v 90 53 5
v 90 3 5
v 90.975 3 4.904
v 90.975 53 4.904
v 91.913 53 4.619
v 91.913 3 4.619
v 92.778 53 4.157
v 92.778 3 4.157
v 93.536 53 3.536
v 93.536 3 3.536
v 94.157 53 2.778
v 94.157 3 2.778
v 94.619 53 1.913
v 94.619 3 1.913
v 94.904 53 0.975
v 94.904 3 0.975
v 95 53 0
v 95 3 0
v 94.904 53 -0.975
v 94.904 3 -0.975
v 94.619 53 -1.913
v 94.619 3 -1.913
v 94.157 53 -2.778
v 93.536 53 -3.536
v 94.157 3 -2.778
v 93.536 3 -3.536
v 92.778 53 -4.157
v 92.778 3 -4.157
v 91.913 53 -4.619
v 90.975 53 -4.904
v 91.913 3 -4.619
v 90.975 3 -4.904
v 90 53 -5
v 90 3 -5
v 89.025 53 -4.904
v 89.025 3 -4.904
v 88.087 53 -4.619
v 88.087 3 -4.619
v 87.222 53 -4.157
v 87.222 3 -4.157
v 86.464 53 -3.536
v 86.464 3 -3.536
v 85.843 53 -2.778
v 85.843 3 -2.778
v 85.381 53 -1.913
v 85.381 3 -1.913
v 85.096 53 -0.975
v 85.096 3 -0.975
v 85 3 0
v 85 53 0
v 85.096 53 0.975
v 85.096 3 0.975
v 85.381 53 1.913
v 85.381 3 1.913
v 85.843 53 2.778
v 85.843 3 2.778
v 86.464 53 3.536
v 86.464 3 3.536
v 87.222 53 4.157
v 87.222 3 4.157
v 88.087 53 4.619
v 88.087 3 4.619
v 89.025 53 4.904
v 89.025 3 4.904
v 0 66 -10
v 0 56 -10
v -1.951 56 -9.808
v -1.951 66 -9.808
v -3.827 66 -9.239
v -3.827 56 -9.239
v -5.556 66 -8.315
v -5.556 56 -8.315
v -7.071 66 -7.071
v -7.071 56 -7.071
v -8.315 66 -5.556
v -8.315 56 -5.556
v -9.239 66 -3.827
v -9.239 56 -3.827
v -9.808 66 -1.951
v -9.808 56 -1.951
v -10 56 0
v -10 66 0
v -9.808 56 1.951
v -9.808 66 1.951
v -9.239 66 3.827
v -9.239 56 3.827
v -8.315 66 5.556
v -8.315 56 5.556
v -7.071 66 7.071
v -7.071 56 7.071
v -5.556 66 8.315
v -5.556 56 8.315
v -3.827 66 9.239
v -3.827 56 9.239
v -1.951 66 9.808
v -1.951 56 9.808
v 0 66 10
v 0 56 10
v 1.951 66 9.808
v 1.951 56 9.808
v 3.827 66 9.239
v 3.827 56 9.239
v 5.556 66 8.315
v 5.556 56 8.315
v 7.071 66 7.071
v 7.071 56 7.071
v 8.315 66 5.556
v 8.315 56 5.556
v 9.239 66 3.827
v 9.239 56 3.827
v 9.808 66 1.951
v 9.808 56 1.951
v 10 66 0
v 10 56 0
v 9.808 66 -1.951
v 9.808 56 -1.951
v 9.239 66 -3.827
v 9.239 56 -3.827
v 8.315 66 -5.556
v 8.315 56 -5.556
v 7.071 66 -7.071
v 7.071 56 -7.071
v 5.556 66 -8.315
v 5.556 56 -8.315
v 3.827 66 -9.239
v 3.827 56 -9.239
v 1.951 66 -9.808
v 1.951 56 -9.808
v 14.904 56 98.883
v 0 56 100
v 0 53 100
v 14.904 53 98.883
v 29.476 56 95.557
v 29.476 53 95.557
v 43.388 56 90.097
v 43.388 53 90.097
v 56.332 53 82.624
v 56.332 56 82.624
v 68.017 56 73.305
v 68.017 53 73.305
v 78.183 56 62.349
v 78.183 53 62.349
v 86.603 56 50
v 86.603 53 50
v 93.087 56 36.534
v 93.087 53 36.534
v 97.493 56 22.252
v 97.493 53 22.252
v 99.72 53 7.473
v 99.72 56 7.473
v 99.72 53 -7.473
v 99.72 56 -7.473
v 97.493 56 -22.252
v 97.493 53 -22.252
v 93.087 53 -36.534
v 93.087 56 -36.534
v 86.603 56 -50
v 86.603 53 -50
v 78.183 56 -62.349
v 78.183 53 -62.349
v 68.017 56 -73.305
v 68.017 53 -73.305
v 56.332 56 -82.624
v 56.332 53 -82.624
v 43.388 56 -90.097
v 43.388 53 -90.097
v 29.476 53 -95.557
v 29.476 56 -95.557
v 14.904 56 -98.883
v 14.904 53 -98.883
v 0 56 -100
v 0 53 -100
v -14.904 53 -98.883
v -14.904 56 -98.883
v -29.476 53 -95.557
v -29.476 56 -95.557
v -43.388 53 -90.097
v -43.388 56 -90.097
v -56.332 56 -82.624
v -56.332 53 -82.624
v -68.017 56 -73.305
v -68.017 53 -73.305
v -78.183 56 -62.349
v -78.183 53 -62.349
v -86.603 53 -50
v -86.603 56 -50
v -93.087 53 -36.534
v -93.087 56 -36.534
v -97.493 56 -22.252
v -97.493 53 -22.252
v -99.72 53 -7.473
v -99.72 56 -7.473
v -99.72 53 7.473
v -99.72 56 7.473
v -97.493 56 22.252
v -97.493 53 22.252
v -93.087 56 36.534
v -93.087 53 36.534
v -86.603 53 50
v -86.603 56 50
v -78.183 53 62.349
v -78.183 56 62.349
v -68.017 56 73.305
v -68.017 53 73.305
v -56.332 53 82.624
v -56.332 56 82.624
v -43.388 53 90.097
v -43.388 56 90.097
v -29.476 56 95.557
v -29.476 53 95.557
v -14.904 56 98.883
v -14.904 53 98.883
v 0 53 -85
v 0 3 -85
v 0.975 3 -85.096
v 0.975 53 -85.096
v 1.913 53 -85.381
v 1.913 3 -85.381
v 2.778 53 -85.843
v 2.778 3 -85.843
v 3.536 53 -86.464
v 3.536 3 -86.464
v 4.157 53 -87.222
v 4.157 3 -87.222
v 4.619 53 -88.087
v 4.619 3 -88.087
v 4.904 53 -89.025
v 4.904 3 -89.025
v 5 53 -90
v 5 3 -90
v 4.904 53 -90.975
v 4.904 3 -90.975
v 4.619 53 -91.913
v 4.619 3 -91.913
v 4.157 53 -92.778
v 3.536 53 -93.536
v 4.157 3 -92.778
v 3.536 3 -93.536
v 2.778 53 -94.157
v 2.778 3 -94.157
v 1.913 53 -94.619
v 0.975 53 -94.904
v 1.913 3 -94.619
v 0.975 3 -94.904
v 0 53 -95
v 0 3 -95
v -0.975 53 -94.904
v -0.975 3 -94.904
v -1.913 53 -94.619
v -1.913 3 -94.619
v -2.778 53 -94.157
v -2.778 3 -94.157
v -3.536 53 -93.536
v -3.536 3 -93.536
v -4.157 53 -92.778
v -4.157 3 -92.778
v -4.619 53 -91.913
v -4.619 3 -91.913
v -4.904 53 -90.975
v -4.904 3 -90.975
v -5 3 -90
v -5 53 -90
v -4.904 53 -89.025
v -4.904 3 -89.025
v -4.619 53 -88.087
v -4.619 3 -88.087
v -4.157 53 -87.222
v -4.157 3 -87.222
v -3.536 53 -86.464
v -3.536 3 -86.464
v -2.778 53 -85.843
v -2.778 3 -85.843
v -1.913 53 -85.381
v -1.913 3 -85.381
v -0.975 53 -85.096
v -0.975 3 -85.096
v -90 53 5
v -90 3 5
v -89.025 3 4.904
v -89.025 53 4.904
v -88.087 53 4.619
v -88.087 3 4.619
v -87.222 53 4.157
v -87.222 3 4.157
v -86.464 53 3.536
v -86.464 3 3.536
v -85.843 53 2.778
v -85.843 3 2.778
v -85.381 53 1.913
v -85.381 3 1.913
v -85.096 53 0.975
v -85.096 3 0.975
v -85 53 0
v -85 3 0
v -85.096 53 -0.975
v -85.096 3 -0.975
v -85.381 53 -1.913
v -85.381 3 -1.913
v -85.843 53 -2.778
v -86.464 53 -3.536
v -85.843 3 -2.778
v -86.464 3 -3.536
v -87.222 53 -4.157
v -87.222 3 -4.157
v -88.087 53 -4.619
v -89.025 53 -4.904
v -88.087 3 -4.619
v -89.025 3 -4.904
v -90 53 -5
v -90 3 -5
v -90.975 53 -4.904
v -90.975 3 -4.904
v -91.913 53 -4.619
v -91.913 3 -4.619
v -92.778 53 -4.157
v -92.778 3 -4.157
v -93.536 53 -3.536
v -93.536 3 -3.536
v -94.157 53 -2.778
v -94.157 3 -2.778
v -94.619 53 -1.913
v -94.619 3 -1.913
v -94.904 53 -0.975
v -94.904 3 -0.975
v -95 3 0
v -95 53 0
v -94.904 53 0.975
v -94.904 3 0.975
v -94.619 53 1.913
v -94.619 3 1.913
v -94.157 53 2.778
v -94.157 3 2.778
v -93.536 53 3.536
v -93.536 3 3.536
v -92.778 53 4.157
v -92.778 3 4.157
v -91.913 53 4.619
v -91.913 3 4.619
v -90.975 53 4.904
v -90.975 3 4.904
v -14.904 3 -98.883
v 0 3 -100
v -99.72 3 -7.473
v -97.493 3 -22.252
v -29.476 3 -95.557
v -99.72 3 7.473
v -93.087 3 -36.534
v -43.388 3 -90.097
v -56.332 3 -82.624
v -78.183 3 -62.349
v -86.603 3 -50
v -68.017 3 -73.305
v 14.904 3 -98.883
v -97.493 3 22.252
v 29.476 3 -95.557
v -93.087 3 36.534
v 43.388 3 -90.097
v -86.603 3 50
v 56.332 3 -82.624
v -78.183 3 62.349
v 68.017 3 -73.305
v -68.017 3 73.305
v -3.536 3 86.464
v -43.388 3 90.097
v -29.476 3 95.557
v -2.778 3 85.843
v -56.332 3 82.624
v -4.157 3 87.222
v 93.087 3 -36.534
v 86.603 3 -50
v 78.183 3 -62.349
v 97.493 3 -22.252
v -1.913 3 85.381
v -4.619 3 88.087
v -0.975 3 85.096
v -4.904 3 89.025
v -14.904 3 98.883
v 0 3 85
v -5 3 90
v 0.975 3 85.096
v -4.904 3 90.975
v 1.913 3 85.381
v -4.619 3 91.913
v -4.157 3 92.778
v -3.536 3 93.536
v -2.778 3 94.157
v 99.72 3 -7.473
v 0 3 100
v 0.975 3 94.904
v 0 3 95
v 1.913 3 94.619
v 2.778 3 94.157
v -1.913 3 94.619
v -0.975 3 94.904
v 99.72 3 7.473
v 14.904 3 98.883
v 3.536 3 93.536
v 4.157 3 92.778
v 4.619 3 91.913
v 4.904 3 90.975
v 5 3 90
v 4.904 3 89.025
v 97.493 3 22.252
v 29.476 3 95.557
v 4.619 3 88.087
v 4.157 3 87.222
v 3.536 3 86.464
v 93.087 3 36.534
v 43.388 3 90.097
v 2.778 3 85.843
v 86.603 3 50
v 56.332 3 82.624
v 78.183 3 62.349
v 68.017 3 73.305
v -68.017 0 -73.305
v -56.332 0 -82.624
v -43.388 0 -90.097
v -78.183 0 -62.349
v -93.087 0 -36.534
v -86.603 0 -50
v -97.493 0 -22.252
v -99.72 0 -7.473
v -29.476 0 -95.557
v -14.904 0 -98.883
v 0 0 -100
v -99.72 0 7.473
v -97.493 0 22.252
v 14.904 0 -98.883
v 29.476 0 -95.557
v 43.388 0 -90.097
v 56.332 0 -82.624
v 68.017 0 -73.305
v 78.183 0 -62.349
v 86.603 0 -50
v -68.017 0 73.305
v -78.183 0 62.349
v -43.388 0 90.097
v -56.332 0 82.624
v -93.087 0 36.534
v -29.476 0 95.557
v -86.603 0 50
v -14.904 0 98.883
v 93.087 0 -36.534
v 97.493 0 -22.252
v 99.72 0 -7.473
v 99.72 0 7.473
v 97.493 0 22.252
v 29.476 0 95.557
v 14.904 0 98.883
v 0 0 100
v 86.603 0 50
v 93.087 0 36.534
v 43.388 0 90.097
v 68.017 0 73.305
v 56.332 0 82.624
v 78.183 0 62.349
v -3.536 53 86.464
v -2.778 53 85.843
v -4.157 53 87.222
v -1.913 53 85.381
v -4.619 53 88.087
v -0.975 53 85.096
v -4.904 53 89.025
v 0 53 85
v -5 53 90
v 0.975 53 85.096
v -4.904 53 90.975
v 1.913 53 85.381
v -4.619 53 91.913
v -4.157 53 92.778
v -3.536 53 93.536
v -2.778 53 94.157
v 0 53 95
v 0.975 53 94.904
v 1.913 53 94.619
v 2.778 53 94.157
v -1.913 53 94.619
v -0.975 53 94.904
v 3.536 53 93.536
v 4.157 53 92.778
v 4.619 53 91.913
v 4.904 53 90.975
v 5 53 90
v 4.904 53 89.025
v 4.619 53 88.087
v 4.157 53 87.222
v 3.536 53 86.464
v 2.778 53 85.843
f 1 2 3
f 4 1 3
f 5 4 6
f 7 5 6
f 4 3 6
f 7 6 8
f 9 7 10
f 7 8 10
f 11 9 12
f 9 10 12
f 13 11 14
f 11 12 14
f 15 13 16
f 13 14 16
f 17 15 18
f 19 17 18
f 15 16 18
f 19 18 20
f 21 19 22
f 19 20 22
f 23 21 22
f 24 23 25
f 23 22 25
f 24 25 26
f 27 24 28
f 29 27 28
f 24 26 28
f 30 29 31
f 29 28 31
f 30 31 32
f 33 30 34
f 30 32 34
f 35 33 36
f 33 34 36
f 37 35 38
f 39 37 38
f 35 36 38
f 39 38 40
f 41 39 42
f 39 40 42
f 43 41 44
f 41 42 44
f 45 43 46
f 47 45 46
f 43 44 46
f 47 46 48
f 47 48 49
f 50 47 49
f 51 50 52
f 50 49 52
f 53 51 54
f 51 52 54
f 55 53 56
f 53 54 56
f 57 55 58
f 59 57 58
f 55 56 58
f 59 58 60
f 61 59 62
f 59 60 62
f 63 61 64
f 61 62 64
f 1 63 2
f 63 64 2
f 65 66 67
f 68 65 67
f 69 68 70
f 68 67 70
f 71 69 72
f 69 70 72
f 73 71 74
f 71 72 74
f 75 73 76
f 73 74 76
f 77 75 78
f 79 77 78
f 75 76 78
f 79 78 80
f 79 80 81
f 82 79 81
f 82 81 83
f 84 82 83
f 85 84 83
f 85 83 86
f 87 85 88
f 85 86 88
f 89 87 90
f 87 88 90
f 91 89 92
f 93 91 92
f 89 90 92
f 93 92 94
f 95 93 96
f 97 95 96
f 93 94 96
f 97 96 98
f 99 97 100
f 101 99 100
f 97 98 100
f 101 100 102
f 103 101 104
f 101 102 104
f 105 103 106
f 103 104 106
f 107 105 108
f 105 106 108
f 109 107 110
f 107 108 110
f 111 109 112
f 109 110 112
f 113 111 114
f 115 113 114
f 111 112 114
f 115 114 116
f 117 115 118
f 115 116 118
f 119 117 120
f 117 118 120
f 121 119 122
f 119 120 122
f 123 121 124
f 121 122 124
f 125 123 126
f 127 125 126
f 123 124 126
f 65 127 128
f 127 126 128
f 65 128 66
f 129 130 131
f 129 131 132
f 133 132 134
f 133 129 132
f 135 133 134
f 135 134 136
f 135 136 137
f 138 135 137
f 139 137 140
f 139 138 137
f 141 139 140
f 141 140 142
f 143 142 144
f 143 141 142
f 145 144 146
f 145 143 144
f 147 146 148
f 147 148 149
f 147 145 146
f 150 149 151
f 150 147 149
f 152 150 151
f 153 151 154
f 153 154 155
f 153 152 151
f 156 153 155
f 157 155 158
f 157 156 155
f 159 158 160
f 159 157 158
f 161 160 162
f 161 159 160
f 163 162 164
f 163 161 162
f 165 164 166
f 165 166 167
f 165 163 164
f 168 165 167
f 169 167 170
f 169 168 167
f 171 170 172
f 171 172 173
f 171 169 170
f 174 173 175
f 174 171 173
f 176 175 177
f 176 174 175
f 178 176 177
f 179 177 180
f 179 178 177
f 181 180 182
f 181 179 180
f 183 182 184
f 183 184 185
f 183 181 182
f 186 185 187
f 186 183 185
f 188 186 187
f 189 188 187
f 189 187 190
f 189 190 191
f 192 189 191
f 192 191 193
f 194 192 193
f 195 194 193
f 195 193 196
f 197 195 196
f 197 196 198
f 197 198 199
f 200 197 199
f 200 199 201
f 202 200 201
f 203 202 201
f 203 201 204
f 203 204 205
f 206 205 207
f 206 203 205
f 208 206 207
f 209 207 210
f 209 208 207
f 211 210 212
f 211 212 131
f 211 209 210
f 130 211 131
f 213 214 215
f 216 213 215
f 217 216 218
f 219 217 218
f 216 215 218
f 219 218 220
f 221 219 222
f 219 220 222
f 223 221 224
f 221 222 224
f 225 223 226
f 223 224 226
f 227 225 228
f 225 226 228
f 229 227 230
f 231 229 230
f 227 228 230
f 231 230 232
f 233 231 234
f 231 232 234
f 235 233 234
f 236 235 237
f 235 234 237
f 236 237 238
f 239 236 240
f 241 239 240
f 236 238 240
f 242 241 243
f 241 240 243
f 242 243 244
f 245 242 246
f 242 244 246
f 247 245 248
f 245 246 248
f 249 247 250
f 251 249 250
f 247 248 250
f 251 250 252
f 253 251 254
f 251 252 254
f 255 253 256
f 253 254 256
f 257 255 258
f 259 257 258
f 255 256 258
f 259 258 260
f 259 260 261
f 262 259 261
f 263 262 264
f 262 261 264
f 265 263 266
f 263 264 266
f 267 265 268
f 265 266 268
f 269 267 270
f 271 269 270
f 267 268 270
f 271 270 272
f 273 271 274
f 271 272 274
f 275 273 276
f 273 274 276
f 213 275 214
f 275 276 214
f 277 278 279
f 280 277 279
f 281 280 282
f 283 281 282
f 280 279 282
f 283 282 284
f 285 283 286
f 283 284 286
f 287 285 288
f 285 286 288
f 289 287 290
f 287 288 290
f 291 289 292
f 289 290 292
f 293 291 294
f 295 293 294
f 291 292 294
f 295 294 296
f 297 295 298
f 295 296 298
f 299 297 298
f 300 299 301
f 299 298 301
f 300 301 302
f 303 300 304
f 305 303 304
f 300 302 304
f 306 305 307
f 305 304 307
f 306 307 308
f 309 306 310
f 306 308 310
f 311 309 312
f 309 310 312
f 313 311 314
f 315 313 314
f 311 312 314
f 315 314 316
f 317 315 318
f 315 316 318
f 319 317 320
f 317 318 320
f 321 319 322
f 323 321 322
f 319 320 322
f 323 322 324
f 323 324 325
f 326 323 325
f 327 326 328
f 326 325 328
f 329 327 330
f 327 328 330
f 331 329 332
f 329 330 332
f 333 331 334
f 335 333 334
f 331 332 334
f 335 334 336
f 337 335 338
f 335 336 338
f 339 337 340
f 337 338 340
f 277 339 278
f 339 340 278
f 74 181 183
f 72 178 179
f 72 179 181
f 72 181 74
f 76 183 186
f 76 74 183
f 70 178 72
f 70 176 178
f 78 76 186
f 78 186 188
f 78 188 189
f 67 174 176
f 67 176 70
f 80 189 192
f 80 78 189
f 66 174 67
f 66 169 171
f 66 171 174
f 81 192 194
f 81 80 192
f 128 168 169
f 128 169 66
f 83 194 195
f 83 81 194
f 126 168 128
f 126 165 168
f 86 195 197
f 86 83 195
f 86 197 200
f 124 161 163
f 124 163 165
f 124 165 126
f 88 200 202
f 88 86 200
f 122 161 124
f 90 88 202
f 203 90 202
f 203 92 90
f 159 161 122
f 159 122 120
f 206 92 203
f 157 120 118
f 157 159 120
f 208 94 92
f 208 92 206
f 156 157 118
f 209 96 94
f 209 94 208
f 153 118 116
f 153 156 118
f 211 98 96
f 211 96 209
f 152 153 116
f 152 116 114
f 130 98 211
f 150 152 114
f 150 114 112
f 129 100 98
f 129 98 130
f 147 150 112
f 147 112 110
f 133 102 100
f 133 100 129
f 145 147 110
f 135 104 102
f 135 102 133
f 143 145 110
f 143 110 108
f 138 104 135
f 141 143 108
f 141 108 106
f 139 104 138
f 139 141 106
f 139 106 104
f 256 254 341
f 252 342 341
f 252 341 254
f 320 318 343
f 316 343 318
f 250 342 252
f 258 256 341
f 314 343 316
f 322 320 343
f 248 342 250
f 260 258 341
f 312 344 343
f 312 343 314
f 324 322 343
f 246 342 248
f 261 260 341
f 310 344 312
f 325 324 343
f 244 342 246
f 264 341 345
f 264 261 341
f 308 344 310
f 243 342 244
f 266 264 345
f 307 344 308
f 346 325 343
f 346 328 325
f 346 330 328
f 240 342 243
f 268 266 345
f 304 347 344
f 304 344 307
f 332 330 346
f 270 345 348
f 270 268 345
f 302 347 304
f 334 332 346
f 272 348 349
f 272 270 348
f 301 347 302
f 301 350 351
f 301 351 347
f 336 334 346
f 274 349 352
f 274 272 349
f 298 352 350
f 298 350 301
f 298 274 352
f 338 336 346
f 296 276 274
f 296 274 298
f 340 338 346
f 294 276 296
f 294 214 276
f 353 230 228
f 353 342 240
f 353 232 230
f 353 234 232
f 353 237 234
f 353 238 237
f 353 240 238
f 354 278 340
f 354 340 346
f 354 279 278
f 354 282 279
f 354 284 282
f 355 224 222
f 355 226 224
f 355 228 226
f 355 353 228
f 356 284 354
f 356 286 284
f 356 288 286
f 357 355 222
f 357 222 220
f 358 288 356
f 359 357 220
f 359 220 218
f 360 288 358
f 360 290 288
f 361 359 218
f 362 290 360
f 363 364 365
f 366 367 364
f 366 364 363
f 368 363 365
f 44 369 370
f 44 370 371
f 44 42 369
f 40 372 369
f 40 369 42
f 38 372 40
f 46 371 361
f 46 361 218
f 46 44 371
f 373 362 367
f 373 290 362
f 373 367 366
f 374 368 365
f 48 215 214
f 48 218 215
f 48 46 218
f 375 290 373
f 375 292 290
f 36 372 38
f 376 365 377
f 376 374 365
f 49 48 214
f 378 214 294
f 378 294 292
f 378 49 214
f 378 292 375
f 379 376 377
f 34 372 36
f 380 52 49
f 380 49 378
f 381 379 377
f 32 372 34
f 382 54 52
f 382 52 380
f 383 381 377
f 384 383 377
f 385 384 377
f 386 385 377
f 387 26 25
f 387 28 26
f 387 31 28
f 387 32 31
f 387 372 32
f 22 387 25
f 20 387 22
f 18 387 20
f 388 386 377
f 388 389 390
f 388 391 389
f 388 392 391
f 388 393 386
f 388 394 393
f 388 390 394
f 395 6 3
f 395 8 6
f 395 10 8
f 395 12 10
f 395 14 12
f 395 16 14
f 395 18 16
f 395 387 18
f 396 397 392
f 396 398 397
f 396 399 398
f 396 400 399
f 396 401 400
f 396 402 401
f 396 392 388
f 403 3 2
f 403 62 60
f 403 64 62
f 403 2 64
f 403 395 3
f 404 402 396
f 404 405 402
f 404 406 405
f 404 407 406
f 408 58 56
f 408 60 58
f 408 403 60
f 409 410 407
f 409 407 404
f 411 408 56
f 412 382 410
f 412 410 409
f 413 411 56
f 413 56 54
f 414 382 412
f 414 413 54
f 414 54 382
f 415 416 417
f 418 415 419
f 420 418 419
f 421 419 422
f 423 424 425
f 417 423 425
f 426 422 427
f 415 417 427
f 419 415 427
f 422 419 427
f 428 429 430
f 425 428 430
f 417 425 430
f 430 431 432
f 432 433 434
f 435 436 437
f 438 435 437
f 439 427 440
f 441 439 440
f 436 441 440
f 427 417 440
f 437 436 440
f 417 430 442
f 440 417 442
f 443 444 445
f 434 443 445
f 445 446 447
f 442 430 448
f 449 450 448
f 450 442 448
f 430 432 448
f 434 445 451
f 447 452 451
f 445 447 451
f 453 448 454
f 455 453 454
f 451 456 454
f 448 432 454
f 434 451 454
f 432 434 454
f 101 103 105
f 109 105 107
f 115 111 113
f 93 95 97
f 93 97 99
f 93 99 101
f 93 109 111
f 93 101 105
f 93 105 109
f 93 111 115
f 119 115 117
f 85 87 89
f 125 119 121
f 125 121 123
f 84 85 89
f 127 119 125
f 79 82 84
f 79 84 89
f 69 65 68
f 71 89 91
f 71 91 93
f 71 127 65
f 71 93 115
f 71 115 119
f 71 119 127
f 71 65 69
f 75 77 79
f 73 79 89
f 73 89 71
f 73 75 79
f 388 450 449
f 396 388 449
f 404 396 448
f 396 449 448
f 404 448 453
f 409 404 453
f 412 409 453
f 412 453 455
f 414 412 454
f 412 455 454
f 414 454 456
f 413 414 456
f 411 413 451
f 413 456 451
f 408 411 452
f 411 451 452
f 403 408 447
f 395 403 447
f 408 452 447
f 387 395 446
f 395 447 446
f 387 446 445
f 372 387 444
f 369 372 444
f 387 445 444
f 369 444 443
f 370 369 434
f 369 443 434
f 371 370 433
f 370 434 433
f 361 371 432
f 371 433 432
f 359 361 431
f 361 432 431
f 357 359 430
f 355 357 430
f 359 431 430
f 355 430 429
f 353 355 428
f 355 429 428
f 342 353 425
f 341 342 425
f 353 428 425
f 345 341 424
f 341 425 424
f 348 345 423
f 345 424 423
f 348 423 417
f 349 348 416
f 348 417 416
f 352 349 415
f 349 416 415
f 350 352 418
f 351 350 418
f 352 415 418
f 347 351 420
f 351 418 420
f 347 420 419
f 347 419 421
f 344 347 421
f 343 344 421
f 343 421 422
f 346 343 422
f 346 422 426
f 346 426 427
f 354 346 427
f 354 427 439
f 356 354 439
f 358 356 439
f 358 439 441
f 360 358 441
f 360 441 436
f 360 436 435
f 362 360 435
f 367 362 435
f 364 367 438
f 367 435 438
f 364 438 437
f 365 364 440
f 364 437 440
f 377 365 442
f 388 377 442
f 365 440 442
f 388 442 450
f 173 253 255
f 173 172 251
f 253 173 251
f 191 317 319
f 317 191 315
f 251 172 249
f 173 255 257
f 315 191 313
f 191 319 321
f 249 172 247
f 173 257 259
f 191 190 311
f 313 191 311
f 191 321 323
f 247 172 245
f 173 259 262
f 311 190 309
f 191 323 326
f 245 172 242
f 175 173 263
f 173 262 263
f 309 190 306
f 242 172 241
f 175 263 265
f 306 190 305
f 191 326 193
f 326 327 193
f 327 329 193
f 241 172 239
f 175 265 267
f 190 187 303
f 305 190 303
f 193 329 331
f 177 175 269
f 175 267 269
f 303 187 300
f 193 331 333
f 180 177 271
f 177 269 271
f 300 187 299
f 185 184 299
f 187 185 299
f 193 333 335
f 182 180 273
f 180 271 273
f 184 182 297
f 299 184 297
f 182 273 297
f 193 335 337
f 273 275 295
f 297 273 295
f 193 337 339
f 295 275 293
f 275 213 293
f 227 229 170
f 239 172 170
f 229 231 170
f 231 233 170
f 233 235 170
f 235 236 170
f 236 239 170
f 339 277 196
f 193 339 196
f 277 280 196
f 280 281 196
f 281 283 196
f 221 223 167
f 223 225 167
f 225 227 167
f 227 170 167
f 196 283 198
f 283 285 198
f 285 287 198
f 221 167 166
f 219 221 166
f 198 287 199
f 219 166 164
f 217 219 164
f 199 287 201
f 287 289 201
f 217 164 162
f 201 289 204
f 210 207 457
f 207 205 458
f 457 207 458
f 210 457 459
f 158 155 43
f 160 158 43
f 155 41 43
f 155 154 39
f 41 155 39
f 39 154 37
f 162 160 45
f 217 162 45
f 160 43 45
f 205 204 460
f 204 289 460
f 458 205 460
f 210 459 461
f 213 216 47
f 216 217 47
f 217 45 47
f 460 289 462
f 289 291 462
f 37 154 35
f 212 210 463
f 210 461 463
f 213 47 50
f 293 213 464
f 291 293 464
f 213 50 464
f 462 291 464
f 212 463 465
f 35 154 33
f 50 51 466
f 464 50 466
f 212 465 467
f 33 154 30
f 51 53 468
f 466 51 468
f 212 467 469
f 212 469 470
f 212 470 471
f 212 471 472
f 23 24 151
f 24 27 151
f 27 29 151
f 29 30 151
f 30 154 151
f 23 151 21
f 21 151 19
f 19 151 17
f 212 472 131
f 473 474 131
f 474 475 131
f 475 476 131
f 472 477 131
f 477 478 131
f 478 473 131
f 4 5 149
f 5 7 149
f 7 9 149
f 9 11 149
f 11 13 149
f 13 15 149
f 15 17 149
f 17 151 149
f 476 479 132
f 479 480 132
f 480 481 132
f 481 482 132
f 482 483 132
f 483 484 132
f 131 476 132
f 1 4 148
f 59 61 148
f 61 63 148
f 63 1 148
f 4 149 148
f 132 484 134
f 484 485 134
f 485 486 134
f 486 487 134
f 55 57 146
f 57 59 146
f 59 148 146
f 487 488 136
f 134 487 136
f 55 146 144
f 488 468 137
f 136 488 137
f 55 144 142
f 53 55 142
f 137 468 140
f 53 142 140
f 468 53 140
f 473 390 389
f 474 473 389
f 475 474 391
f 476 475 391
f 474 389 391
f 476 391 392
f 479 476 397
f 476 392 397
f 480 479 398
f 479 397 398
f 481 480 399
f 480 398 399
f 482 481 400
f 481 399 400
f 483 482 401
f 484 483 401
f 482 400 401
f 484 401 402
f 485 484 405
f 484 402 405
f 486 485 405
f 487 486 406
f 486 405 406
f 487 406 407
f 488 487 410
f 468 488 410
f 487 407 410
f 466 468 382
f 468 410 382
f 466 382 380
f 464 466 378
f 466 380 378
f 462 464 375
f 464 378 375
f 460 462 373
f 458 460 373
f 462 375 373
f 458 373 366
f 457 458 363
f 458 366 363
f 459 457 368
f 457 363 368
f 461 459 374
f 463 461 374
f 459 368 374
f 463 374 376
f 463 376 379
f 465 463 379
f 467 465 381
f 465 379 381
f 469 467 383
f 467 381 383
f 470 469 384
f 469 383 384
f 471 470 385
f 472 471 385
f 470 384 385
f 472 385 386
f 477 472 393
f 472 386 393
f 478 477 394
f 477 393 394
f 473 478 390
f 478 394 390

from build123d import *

# Parameters (mm, degrees)
SKETCH1_R           = 100
BOSS_EXTRUDE1_DEPTH = 3
SKETCH2_R           = 5
BOSS_EXTRUDE2_DEPTH = 50
SKETCH3_R           = 10
BOSS_EXTRUDE3_DEPTH = 10


with BuildPart() as part:
    # Sketch1 → Boss-Extrude1 (new body)
    with BuildSketch(Plane(origin=(0, 0, 0), x_dir=(1, 0, 0), z_dir=(0, 1, 0))):
        with Locations(Location((0, 0, 0), (0, 0, 270))):
            Circle(SKETCH1_R)
    boss_extrude1 = extrude(amount=BOSS_EXTRUDE1_DEPTH)

    # Sketch2 → Boss-Extrude2 (add)
    with BuildSketch(Plane(origin=(0, 3, 0), x_dir=(1, 0, 0), z_dir=(0, 1, 0))):
        with Locations(Location((-90, 0, 0), (0, 0, 270))):
            Circle(SKETCH2_R)
        with Locations(Location((0, 90, 0), (0, 0, 270))):
            Circle(SKETCH2_R)
        with Locations(Location((90, 0, 0), (0, 0, 270))):
            Circle(SKETCH2_R)
        with Locations(Location((0, -90, 0), (0, 0, 270))):
            Circle(SKETCH2_R)
    extrude(amount=BOSS_EXTRUDE2_DEPTH)

    # Mirror1: Boss-Extrude1 across plane
    add(boss_extrude1.mirror(Plane.ZX.offset(28)))

    # Sketch3 → Boss-Extrude3 (add)
    with BuildSketch(Plane(origin=(0, 56, 0), x_dir=(1, 0, 0), z_dir=(0, 1, 0))):
        with Locations(Location((0, 0, 0), (0, 0, 90))):
            Circle(SKETCH3_R)
    extrude(amount=BOSS_EXTRUDE3_DEPTH)


solid = part.part
